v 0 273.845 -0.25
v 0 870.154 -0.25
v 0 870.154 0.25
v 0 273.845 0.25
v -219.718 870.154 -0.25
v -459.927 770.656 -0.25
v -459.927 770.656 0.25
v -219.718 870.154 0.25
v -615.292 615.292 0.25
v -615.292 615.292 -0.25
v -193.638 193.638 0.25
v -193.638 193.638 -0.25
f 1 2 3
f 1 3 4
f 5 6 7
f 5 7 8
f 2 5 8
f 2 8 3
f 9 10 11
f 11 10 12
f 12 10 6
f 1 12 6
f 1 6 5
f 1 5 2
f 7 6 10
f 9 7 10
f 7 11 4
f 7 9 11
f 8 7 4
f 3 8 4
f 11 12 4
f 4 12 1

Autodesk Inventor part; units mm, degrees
ref_plane "YZ Plane" through (0, 0, 0) normal (1, 0, 0) x (0, 1, 0)
ref_plane "XZ Plane" through (0, 0, 0) normal (0, 1, 0) x (-1, 0, 0)
ref_plane "XY Plane" through (0, 0, 0) normal (0, 0, 1) x (1, 0, 0)
sketch "Sketch1" plane through (0, 0, 0) normal (0, 0, 1) x (1, 0, 0)
  line L0 (0, 273.8452) -> (193.6378, 193.6378) construction
  line L1 (193.6378, 193.6378) -> (273.8452, 0) construction
  line L2 (273.8452, 0) -> (193.6378, -193.6378) construction
  line L3 (193.6378, -193.6378) -> (0, -273.8452) construction
  line L4 (0, -273.8452) -> (-193.6378, -193.6378) construction
  line L5 (-193.6378, -193.6378) -> (-273.8452, 0) construction
  line L6 (-273.8452, 0) -> (-193.6378, 193.6378) construction
  line L7 (-193.6378, 193.6378) -> (0, 273.8452)
  line L8 (-193.6378, 193.6378) -> (0, 273.8452)
  line L9 (-459.9272, 770.6562) -> (-219.7185, 870.1539)
  line L10 (-96.8189, 233.7415) -> (-339.8229, 820.405) construction
  line L11 (-219.7185, 870.1539) -> (0, 870.1539)
  line L12 (0, 870.1539) -> (0, 273.8452)
  line L13 (-459.9272, 770.6562) -> (-615.2917, 615.2917)
  line L14 (-615.2917, 615.2917) -> (-193.6378, 193.6378)
  point P0 (0, 0)
  point P1 (0, 0)
  dimension "d0" = 506
  dimension "d2" = 260
  dimension "d3" = 635
extrude "Extrusion1" add sketch "Sketch1" along normal mid plane 0.5
sketch "Sketch7" plane through (0, 0, 0.25) normal (0, 0, 1) x (1, 0, 0)
  line L0 (-13, 865.1539) -> (-5, 865.1539)
  line L1 (-5, 865.1539) -> (-5, 857.1539)
  line L2 (-5, 857.1539) -> (-13, 857.1539)
  line L3 (-13, 857.1539) -> (-13, 865.1539)
  line L4 (0, 870.1539) -> (-219.7185, 870.1539) projected
  line L5 (0, 273.8452) -> (0, 870.1539) projected
  point P0 (0, 0)
  dimension "d54" = 8
  dimension "d55" = 8
  dimension "d56" = 5
  dimension "d57" = 5
extrude "Extrusion5" [suppressed]
pattern_linear "Rectangular Pattern1" [suppressed]
equation "\"d0\" = Барабан_габарит_по_кассетам"
equation "\"d2\" = Кассета_длина_грани"
equation "\"d3\" = Кассета_высота"
equation "\"BendRadius\" = Thickness"
equation "\"BendReliefWidth\" = Thickness"
equation "\"BendReliefDepth\" = 0.5 * Thickness"
equation "\"CornerReliefSize\" = 4 * Thickness"
equation "\"MinimumRemnant\" = 2 * Thickness"
equation "\"TransitionRadius\" = BendRadius"
equation "\"JacobiRadiusSize\" = BendRadius"
equation "\"GapSize\" = Thickness"
equation "\"Барабан_габарит_по_кассетам\" = 506"
equation "\"Кассета_длина_грани\" = 260"
equation "\"Кассета_высота\" = 635"
equation "\"Thickness\" = 0.5"
properties part number "ДМС 207 Сетка кассеты"
